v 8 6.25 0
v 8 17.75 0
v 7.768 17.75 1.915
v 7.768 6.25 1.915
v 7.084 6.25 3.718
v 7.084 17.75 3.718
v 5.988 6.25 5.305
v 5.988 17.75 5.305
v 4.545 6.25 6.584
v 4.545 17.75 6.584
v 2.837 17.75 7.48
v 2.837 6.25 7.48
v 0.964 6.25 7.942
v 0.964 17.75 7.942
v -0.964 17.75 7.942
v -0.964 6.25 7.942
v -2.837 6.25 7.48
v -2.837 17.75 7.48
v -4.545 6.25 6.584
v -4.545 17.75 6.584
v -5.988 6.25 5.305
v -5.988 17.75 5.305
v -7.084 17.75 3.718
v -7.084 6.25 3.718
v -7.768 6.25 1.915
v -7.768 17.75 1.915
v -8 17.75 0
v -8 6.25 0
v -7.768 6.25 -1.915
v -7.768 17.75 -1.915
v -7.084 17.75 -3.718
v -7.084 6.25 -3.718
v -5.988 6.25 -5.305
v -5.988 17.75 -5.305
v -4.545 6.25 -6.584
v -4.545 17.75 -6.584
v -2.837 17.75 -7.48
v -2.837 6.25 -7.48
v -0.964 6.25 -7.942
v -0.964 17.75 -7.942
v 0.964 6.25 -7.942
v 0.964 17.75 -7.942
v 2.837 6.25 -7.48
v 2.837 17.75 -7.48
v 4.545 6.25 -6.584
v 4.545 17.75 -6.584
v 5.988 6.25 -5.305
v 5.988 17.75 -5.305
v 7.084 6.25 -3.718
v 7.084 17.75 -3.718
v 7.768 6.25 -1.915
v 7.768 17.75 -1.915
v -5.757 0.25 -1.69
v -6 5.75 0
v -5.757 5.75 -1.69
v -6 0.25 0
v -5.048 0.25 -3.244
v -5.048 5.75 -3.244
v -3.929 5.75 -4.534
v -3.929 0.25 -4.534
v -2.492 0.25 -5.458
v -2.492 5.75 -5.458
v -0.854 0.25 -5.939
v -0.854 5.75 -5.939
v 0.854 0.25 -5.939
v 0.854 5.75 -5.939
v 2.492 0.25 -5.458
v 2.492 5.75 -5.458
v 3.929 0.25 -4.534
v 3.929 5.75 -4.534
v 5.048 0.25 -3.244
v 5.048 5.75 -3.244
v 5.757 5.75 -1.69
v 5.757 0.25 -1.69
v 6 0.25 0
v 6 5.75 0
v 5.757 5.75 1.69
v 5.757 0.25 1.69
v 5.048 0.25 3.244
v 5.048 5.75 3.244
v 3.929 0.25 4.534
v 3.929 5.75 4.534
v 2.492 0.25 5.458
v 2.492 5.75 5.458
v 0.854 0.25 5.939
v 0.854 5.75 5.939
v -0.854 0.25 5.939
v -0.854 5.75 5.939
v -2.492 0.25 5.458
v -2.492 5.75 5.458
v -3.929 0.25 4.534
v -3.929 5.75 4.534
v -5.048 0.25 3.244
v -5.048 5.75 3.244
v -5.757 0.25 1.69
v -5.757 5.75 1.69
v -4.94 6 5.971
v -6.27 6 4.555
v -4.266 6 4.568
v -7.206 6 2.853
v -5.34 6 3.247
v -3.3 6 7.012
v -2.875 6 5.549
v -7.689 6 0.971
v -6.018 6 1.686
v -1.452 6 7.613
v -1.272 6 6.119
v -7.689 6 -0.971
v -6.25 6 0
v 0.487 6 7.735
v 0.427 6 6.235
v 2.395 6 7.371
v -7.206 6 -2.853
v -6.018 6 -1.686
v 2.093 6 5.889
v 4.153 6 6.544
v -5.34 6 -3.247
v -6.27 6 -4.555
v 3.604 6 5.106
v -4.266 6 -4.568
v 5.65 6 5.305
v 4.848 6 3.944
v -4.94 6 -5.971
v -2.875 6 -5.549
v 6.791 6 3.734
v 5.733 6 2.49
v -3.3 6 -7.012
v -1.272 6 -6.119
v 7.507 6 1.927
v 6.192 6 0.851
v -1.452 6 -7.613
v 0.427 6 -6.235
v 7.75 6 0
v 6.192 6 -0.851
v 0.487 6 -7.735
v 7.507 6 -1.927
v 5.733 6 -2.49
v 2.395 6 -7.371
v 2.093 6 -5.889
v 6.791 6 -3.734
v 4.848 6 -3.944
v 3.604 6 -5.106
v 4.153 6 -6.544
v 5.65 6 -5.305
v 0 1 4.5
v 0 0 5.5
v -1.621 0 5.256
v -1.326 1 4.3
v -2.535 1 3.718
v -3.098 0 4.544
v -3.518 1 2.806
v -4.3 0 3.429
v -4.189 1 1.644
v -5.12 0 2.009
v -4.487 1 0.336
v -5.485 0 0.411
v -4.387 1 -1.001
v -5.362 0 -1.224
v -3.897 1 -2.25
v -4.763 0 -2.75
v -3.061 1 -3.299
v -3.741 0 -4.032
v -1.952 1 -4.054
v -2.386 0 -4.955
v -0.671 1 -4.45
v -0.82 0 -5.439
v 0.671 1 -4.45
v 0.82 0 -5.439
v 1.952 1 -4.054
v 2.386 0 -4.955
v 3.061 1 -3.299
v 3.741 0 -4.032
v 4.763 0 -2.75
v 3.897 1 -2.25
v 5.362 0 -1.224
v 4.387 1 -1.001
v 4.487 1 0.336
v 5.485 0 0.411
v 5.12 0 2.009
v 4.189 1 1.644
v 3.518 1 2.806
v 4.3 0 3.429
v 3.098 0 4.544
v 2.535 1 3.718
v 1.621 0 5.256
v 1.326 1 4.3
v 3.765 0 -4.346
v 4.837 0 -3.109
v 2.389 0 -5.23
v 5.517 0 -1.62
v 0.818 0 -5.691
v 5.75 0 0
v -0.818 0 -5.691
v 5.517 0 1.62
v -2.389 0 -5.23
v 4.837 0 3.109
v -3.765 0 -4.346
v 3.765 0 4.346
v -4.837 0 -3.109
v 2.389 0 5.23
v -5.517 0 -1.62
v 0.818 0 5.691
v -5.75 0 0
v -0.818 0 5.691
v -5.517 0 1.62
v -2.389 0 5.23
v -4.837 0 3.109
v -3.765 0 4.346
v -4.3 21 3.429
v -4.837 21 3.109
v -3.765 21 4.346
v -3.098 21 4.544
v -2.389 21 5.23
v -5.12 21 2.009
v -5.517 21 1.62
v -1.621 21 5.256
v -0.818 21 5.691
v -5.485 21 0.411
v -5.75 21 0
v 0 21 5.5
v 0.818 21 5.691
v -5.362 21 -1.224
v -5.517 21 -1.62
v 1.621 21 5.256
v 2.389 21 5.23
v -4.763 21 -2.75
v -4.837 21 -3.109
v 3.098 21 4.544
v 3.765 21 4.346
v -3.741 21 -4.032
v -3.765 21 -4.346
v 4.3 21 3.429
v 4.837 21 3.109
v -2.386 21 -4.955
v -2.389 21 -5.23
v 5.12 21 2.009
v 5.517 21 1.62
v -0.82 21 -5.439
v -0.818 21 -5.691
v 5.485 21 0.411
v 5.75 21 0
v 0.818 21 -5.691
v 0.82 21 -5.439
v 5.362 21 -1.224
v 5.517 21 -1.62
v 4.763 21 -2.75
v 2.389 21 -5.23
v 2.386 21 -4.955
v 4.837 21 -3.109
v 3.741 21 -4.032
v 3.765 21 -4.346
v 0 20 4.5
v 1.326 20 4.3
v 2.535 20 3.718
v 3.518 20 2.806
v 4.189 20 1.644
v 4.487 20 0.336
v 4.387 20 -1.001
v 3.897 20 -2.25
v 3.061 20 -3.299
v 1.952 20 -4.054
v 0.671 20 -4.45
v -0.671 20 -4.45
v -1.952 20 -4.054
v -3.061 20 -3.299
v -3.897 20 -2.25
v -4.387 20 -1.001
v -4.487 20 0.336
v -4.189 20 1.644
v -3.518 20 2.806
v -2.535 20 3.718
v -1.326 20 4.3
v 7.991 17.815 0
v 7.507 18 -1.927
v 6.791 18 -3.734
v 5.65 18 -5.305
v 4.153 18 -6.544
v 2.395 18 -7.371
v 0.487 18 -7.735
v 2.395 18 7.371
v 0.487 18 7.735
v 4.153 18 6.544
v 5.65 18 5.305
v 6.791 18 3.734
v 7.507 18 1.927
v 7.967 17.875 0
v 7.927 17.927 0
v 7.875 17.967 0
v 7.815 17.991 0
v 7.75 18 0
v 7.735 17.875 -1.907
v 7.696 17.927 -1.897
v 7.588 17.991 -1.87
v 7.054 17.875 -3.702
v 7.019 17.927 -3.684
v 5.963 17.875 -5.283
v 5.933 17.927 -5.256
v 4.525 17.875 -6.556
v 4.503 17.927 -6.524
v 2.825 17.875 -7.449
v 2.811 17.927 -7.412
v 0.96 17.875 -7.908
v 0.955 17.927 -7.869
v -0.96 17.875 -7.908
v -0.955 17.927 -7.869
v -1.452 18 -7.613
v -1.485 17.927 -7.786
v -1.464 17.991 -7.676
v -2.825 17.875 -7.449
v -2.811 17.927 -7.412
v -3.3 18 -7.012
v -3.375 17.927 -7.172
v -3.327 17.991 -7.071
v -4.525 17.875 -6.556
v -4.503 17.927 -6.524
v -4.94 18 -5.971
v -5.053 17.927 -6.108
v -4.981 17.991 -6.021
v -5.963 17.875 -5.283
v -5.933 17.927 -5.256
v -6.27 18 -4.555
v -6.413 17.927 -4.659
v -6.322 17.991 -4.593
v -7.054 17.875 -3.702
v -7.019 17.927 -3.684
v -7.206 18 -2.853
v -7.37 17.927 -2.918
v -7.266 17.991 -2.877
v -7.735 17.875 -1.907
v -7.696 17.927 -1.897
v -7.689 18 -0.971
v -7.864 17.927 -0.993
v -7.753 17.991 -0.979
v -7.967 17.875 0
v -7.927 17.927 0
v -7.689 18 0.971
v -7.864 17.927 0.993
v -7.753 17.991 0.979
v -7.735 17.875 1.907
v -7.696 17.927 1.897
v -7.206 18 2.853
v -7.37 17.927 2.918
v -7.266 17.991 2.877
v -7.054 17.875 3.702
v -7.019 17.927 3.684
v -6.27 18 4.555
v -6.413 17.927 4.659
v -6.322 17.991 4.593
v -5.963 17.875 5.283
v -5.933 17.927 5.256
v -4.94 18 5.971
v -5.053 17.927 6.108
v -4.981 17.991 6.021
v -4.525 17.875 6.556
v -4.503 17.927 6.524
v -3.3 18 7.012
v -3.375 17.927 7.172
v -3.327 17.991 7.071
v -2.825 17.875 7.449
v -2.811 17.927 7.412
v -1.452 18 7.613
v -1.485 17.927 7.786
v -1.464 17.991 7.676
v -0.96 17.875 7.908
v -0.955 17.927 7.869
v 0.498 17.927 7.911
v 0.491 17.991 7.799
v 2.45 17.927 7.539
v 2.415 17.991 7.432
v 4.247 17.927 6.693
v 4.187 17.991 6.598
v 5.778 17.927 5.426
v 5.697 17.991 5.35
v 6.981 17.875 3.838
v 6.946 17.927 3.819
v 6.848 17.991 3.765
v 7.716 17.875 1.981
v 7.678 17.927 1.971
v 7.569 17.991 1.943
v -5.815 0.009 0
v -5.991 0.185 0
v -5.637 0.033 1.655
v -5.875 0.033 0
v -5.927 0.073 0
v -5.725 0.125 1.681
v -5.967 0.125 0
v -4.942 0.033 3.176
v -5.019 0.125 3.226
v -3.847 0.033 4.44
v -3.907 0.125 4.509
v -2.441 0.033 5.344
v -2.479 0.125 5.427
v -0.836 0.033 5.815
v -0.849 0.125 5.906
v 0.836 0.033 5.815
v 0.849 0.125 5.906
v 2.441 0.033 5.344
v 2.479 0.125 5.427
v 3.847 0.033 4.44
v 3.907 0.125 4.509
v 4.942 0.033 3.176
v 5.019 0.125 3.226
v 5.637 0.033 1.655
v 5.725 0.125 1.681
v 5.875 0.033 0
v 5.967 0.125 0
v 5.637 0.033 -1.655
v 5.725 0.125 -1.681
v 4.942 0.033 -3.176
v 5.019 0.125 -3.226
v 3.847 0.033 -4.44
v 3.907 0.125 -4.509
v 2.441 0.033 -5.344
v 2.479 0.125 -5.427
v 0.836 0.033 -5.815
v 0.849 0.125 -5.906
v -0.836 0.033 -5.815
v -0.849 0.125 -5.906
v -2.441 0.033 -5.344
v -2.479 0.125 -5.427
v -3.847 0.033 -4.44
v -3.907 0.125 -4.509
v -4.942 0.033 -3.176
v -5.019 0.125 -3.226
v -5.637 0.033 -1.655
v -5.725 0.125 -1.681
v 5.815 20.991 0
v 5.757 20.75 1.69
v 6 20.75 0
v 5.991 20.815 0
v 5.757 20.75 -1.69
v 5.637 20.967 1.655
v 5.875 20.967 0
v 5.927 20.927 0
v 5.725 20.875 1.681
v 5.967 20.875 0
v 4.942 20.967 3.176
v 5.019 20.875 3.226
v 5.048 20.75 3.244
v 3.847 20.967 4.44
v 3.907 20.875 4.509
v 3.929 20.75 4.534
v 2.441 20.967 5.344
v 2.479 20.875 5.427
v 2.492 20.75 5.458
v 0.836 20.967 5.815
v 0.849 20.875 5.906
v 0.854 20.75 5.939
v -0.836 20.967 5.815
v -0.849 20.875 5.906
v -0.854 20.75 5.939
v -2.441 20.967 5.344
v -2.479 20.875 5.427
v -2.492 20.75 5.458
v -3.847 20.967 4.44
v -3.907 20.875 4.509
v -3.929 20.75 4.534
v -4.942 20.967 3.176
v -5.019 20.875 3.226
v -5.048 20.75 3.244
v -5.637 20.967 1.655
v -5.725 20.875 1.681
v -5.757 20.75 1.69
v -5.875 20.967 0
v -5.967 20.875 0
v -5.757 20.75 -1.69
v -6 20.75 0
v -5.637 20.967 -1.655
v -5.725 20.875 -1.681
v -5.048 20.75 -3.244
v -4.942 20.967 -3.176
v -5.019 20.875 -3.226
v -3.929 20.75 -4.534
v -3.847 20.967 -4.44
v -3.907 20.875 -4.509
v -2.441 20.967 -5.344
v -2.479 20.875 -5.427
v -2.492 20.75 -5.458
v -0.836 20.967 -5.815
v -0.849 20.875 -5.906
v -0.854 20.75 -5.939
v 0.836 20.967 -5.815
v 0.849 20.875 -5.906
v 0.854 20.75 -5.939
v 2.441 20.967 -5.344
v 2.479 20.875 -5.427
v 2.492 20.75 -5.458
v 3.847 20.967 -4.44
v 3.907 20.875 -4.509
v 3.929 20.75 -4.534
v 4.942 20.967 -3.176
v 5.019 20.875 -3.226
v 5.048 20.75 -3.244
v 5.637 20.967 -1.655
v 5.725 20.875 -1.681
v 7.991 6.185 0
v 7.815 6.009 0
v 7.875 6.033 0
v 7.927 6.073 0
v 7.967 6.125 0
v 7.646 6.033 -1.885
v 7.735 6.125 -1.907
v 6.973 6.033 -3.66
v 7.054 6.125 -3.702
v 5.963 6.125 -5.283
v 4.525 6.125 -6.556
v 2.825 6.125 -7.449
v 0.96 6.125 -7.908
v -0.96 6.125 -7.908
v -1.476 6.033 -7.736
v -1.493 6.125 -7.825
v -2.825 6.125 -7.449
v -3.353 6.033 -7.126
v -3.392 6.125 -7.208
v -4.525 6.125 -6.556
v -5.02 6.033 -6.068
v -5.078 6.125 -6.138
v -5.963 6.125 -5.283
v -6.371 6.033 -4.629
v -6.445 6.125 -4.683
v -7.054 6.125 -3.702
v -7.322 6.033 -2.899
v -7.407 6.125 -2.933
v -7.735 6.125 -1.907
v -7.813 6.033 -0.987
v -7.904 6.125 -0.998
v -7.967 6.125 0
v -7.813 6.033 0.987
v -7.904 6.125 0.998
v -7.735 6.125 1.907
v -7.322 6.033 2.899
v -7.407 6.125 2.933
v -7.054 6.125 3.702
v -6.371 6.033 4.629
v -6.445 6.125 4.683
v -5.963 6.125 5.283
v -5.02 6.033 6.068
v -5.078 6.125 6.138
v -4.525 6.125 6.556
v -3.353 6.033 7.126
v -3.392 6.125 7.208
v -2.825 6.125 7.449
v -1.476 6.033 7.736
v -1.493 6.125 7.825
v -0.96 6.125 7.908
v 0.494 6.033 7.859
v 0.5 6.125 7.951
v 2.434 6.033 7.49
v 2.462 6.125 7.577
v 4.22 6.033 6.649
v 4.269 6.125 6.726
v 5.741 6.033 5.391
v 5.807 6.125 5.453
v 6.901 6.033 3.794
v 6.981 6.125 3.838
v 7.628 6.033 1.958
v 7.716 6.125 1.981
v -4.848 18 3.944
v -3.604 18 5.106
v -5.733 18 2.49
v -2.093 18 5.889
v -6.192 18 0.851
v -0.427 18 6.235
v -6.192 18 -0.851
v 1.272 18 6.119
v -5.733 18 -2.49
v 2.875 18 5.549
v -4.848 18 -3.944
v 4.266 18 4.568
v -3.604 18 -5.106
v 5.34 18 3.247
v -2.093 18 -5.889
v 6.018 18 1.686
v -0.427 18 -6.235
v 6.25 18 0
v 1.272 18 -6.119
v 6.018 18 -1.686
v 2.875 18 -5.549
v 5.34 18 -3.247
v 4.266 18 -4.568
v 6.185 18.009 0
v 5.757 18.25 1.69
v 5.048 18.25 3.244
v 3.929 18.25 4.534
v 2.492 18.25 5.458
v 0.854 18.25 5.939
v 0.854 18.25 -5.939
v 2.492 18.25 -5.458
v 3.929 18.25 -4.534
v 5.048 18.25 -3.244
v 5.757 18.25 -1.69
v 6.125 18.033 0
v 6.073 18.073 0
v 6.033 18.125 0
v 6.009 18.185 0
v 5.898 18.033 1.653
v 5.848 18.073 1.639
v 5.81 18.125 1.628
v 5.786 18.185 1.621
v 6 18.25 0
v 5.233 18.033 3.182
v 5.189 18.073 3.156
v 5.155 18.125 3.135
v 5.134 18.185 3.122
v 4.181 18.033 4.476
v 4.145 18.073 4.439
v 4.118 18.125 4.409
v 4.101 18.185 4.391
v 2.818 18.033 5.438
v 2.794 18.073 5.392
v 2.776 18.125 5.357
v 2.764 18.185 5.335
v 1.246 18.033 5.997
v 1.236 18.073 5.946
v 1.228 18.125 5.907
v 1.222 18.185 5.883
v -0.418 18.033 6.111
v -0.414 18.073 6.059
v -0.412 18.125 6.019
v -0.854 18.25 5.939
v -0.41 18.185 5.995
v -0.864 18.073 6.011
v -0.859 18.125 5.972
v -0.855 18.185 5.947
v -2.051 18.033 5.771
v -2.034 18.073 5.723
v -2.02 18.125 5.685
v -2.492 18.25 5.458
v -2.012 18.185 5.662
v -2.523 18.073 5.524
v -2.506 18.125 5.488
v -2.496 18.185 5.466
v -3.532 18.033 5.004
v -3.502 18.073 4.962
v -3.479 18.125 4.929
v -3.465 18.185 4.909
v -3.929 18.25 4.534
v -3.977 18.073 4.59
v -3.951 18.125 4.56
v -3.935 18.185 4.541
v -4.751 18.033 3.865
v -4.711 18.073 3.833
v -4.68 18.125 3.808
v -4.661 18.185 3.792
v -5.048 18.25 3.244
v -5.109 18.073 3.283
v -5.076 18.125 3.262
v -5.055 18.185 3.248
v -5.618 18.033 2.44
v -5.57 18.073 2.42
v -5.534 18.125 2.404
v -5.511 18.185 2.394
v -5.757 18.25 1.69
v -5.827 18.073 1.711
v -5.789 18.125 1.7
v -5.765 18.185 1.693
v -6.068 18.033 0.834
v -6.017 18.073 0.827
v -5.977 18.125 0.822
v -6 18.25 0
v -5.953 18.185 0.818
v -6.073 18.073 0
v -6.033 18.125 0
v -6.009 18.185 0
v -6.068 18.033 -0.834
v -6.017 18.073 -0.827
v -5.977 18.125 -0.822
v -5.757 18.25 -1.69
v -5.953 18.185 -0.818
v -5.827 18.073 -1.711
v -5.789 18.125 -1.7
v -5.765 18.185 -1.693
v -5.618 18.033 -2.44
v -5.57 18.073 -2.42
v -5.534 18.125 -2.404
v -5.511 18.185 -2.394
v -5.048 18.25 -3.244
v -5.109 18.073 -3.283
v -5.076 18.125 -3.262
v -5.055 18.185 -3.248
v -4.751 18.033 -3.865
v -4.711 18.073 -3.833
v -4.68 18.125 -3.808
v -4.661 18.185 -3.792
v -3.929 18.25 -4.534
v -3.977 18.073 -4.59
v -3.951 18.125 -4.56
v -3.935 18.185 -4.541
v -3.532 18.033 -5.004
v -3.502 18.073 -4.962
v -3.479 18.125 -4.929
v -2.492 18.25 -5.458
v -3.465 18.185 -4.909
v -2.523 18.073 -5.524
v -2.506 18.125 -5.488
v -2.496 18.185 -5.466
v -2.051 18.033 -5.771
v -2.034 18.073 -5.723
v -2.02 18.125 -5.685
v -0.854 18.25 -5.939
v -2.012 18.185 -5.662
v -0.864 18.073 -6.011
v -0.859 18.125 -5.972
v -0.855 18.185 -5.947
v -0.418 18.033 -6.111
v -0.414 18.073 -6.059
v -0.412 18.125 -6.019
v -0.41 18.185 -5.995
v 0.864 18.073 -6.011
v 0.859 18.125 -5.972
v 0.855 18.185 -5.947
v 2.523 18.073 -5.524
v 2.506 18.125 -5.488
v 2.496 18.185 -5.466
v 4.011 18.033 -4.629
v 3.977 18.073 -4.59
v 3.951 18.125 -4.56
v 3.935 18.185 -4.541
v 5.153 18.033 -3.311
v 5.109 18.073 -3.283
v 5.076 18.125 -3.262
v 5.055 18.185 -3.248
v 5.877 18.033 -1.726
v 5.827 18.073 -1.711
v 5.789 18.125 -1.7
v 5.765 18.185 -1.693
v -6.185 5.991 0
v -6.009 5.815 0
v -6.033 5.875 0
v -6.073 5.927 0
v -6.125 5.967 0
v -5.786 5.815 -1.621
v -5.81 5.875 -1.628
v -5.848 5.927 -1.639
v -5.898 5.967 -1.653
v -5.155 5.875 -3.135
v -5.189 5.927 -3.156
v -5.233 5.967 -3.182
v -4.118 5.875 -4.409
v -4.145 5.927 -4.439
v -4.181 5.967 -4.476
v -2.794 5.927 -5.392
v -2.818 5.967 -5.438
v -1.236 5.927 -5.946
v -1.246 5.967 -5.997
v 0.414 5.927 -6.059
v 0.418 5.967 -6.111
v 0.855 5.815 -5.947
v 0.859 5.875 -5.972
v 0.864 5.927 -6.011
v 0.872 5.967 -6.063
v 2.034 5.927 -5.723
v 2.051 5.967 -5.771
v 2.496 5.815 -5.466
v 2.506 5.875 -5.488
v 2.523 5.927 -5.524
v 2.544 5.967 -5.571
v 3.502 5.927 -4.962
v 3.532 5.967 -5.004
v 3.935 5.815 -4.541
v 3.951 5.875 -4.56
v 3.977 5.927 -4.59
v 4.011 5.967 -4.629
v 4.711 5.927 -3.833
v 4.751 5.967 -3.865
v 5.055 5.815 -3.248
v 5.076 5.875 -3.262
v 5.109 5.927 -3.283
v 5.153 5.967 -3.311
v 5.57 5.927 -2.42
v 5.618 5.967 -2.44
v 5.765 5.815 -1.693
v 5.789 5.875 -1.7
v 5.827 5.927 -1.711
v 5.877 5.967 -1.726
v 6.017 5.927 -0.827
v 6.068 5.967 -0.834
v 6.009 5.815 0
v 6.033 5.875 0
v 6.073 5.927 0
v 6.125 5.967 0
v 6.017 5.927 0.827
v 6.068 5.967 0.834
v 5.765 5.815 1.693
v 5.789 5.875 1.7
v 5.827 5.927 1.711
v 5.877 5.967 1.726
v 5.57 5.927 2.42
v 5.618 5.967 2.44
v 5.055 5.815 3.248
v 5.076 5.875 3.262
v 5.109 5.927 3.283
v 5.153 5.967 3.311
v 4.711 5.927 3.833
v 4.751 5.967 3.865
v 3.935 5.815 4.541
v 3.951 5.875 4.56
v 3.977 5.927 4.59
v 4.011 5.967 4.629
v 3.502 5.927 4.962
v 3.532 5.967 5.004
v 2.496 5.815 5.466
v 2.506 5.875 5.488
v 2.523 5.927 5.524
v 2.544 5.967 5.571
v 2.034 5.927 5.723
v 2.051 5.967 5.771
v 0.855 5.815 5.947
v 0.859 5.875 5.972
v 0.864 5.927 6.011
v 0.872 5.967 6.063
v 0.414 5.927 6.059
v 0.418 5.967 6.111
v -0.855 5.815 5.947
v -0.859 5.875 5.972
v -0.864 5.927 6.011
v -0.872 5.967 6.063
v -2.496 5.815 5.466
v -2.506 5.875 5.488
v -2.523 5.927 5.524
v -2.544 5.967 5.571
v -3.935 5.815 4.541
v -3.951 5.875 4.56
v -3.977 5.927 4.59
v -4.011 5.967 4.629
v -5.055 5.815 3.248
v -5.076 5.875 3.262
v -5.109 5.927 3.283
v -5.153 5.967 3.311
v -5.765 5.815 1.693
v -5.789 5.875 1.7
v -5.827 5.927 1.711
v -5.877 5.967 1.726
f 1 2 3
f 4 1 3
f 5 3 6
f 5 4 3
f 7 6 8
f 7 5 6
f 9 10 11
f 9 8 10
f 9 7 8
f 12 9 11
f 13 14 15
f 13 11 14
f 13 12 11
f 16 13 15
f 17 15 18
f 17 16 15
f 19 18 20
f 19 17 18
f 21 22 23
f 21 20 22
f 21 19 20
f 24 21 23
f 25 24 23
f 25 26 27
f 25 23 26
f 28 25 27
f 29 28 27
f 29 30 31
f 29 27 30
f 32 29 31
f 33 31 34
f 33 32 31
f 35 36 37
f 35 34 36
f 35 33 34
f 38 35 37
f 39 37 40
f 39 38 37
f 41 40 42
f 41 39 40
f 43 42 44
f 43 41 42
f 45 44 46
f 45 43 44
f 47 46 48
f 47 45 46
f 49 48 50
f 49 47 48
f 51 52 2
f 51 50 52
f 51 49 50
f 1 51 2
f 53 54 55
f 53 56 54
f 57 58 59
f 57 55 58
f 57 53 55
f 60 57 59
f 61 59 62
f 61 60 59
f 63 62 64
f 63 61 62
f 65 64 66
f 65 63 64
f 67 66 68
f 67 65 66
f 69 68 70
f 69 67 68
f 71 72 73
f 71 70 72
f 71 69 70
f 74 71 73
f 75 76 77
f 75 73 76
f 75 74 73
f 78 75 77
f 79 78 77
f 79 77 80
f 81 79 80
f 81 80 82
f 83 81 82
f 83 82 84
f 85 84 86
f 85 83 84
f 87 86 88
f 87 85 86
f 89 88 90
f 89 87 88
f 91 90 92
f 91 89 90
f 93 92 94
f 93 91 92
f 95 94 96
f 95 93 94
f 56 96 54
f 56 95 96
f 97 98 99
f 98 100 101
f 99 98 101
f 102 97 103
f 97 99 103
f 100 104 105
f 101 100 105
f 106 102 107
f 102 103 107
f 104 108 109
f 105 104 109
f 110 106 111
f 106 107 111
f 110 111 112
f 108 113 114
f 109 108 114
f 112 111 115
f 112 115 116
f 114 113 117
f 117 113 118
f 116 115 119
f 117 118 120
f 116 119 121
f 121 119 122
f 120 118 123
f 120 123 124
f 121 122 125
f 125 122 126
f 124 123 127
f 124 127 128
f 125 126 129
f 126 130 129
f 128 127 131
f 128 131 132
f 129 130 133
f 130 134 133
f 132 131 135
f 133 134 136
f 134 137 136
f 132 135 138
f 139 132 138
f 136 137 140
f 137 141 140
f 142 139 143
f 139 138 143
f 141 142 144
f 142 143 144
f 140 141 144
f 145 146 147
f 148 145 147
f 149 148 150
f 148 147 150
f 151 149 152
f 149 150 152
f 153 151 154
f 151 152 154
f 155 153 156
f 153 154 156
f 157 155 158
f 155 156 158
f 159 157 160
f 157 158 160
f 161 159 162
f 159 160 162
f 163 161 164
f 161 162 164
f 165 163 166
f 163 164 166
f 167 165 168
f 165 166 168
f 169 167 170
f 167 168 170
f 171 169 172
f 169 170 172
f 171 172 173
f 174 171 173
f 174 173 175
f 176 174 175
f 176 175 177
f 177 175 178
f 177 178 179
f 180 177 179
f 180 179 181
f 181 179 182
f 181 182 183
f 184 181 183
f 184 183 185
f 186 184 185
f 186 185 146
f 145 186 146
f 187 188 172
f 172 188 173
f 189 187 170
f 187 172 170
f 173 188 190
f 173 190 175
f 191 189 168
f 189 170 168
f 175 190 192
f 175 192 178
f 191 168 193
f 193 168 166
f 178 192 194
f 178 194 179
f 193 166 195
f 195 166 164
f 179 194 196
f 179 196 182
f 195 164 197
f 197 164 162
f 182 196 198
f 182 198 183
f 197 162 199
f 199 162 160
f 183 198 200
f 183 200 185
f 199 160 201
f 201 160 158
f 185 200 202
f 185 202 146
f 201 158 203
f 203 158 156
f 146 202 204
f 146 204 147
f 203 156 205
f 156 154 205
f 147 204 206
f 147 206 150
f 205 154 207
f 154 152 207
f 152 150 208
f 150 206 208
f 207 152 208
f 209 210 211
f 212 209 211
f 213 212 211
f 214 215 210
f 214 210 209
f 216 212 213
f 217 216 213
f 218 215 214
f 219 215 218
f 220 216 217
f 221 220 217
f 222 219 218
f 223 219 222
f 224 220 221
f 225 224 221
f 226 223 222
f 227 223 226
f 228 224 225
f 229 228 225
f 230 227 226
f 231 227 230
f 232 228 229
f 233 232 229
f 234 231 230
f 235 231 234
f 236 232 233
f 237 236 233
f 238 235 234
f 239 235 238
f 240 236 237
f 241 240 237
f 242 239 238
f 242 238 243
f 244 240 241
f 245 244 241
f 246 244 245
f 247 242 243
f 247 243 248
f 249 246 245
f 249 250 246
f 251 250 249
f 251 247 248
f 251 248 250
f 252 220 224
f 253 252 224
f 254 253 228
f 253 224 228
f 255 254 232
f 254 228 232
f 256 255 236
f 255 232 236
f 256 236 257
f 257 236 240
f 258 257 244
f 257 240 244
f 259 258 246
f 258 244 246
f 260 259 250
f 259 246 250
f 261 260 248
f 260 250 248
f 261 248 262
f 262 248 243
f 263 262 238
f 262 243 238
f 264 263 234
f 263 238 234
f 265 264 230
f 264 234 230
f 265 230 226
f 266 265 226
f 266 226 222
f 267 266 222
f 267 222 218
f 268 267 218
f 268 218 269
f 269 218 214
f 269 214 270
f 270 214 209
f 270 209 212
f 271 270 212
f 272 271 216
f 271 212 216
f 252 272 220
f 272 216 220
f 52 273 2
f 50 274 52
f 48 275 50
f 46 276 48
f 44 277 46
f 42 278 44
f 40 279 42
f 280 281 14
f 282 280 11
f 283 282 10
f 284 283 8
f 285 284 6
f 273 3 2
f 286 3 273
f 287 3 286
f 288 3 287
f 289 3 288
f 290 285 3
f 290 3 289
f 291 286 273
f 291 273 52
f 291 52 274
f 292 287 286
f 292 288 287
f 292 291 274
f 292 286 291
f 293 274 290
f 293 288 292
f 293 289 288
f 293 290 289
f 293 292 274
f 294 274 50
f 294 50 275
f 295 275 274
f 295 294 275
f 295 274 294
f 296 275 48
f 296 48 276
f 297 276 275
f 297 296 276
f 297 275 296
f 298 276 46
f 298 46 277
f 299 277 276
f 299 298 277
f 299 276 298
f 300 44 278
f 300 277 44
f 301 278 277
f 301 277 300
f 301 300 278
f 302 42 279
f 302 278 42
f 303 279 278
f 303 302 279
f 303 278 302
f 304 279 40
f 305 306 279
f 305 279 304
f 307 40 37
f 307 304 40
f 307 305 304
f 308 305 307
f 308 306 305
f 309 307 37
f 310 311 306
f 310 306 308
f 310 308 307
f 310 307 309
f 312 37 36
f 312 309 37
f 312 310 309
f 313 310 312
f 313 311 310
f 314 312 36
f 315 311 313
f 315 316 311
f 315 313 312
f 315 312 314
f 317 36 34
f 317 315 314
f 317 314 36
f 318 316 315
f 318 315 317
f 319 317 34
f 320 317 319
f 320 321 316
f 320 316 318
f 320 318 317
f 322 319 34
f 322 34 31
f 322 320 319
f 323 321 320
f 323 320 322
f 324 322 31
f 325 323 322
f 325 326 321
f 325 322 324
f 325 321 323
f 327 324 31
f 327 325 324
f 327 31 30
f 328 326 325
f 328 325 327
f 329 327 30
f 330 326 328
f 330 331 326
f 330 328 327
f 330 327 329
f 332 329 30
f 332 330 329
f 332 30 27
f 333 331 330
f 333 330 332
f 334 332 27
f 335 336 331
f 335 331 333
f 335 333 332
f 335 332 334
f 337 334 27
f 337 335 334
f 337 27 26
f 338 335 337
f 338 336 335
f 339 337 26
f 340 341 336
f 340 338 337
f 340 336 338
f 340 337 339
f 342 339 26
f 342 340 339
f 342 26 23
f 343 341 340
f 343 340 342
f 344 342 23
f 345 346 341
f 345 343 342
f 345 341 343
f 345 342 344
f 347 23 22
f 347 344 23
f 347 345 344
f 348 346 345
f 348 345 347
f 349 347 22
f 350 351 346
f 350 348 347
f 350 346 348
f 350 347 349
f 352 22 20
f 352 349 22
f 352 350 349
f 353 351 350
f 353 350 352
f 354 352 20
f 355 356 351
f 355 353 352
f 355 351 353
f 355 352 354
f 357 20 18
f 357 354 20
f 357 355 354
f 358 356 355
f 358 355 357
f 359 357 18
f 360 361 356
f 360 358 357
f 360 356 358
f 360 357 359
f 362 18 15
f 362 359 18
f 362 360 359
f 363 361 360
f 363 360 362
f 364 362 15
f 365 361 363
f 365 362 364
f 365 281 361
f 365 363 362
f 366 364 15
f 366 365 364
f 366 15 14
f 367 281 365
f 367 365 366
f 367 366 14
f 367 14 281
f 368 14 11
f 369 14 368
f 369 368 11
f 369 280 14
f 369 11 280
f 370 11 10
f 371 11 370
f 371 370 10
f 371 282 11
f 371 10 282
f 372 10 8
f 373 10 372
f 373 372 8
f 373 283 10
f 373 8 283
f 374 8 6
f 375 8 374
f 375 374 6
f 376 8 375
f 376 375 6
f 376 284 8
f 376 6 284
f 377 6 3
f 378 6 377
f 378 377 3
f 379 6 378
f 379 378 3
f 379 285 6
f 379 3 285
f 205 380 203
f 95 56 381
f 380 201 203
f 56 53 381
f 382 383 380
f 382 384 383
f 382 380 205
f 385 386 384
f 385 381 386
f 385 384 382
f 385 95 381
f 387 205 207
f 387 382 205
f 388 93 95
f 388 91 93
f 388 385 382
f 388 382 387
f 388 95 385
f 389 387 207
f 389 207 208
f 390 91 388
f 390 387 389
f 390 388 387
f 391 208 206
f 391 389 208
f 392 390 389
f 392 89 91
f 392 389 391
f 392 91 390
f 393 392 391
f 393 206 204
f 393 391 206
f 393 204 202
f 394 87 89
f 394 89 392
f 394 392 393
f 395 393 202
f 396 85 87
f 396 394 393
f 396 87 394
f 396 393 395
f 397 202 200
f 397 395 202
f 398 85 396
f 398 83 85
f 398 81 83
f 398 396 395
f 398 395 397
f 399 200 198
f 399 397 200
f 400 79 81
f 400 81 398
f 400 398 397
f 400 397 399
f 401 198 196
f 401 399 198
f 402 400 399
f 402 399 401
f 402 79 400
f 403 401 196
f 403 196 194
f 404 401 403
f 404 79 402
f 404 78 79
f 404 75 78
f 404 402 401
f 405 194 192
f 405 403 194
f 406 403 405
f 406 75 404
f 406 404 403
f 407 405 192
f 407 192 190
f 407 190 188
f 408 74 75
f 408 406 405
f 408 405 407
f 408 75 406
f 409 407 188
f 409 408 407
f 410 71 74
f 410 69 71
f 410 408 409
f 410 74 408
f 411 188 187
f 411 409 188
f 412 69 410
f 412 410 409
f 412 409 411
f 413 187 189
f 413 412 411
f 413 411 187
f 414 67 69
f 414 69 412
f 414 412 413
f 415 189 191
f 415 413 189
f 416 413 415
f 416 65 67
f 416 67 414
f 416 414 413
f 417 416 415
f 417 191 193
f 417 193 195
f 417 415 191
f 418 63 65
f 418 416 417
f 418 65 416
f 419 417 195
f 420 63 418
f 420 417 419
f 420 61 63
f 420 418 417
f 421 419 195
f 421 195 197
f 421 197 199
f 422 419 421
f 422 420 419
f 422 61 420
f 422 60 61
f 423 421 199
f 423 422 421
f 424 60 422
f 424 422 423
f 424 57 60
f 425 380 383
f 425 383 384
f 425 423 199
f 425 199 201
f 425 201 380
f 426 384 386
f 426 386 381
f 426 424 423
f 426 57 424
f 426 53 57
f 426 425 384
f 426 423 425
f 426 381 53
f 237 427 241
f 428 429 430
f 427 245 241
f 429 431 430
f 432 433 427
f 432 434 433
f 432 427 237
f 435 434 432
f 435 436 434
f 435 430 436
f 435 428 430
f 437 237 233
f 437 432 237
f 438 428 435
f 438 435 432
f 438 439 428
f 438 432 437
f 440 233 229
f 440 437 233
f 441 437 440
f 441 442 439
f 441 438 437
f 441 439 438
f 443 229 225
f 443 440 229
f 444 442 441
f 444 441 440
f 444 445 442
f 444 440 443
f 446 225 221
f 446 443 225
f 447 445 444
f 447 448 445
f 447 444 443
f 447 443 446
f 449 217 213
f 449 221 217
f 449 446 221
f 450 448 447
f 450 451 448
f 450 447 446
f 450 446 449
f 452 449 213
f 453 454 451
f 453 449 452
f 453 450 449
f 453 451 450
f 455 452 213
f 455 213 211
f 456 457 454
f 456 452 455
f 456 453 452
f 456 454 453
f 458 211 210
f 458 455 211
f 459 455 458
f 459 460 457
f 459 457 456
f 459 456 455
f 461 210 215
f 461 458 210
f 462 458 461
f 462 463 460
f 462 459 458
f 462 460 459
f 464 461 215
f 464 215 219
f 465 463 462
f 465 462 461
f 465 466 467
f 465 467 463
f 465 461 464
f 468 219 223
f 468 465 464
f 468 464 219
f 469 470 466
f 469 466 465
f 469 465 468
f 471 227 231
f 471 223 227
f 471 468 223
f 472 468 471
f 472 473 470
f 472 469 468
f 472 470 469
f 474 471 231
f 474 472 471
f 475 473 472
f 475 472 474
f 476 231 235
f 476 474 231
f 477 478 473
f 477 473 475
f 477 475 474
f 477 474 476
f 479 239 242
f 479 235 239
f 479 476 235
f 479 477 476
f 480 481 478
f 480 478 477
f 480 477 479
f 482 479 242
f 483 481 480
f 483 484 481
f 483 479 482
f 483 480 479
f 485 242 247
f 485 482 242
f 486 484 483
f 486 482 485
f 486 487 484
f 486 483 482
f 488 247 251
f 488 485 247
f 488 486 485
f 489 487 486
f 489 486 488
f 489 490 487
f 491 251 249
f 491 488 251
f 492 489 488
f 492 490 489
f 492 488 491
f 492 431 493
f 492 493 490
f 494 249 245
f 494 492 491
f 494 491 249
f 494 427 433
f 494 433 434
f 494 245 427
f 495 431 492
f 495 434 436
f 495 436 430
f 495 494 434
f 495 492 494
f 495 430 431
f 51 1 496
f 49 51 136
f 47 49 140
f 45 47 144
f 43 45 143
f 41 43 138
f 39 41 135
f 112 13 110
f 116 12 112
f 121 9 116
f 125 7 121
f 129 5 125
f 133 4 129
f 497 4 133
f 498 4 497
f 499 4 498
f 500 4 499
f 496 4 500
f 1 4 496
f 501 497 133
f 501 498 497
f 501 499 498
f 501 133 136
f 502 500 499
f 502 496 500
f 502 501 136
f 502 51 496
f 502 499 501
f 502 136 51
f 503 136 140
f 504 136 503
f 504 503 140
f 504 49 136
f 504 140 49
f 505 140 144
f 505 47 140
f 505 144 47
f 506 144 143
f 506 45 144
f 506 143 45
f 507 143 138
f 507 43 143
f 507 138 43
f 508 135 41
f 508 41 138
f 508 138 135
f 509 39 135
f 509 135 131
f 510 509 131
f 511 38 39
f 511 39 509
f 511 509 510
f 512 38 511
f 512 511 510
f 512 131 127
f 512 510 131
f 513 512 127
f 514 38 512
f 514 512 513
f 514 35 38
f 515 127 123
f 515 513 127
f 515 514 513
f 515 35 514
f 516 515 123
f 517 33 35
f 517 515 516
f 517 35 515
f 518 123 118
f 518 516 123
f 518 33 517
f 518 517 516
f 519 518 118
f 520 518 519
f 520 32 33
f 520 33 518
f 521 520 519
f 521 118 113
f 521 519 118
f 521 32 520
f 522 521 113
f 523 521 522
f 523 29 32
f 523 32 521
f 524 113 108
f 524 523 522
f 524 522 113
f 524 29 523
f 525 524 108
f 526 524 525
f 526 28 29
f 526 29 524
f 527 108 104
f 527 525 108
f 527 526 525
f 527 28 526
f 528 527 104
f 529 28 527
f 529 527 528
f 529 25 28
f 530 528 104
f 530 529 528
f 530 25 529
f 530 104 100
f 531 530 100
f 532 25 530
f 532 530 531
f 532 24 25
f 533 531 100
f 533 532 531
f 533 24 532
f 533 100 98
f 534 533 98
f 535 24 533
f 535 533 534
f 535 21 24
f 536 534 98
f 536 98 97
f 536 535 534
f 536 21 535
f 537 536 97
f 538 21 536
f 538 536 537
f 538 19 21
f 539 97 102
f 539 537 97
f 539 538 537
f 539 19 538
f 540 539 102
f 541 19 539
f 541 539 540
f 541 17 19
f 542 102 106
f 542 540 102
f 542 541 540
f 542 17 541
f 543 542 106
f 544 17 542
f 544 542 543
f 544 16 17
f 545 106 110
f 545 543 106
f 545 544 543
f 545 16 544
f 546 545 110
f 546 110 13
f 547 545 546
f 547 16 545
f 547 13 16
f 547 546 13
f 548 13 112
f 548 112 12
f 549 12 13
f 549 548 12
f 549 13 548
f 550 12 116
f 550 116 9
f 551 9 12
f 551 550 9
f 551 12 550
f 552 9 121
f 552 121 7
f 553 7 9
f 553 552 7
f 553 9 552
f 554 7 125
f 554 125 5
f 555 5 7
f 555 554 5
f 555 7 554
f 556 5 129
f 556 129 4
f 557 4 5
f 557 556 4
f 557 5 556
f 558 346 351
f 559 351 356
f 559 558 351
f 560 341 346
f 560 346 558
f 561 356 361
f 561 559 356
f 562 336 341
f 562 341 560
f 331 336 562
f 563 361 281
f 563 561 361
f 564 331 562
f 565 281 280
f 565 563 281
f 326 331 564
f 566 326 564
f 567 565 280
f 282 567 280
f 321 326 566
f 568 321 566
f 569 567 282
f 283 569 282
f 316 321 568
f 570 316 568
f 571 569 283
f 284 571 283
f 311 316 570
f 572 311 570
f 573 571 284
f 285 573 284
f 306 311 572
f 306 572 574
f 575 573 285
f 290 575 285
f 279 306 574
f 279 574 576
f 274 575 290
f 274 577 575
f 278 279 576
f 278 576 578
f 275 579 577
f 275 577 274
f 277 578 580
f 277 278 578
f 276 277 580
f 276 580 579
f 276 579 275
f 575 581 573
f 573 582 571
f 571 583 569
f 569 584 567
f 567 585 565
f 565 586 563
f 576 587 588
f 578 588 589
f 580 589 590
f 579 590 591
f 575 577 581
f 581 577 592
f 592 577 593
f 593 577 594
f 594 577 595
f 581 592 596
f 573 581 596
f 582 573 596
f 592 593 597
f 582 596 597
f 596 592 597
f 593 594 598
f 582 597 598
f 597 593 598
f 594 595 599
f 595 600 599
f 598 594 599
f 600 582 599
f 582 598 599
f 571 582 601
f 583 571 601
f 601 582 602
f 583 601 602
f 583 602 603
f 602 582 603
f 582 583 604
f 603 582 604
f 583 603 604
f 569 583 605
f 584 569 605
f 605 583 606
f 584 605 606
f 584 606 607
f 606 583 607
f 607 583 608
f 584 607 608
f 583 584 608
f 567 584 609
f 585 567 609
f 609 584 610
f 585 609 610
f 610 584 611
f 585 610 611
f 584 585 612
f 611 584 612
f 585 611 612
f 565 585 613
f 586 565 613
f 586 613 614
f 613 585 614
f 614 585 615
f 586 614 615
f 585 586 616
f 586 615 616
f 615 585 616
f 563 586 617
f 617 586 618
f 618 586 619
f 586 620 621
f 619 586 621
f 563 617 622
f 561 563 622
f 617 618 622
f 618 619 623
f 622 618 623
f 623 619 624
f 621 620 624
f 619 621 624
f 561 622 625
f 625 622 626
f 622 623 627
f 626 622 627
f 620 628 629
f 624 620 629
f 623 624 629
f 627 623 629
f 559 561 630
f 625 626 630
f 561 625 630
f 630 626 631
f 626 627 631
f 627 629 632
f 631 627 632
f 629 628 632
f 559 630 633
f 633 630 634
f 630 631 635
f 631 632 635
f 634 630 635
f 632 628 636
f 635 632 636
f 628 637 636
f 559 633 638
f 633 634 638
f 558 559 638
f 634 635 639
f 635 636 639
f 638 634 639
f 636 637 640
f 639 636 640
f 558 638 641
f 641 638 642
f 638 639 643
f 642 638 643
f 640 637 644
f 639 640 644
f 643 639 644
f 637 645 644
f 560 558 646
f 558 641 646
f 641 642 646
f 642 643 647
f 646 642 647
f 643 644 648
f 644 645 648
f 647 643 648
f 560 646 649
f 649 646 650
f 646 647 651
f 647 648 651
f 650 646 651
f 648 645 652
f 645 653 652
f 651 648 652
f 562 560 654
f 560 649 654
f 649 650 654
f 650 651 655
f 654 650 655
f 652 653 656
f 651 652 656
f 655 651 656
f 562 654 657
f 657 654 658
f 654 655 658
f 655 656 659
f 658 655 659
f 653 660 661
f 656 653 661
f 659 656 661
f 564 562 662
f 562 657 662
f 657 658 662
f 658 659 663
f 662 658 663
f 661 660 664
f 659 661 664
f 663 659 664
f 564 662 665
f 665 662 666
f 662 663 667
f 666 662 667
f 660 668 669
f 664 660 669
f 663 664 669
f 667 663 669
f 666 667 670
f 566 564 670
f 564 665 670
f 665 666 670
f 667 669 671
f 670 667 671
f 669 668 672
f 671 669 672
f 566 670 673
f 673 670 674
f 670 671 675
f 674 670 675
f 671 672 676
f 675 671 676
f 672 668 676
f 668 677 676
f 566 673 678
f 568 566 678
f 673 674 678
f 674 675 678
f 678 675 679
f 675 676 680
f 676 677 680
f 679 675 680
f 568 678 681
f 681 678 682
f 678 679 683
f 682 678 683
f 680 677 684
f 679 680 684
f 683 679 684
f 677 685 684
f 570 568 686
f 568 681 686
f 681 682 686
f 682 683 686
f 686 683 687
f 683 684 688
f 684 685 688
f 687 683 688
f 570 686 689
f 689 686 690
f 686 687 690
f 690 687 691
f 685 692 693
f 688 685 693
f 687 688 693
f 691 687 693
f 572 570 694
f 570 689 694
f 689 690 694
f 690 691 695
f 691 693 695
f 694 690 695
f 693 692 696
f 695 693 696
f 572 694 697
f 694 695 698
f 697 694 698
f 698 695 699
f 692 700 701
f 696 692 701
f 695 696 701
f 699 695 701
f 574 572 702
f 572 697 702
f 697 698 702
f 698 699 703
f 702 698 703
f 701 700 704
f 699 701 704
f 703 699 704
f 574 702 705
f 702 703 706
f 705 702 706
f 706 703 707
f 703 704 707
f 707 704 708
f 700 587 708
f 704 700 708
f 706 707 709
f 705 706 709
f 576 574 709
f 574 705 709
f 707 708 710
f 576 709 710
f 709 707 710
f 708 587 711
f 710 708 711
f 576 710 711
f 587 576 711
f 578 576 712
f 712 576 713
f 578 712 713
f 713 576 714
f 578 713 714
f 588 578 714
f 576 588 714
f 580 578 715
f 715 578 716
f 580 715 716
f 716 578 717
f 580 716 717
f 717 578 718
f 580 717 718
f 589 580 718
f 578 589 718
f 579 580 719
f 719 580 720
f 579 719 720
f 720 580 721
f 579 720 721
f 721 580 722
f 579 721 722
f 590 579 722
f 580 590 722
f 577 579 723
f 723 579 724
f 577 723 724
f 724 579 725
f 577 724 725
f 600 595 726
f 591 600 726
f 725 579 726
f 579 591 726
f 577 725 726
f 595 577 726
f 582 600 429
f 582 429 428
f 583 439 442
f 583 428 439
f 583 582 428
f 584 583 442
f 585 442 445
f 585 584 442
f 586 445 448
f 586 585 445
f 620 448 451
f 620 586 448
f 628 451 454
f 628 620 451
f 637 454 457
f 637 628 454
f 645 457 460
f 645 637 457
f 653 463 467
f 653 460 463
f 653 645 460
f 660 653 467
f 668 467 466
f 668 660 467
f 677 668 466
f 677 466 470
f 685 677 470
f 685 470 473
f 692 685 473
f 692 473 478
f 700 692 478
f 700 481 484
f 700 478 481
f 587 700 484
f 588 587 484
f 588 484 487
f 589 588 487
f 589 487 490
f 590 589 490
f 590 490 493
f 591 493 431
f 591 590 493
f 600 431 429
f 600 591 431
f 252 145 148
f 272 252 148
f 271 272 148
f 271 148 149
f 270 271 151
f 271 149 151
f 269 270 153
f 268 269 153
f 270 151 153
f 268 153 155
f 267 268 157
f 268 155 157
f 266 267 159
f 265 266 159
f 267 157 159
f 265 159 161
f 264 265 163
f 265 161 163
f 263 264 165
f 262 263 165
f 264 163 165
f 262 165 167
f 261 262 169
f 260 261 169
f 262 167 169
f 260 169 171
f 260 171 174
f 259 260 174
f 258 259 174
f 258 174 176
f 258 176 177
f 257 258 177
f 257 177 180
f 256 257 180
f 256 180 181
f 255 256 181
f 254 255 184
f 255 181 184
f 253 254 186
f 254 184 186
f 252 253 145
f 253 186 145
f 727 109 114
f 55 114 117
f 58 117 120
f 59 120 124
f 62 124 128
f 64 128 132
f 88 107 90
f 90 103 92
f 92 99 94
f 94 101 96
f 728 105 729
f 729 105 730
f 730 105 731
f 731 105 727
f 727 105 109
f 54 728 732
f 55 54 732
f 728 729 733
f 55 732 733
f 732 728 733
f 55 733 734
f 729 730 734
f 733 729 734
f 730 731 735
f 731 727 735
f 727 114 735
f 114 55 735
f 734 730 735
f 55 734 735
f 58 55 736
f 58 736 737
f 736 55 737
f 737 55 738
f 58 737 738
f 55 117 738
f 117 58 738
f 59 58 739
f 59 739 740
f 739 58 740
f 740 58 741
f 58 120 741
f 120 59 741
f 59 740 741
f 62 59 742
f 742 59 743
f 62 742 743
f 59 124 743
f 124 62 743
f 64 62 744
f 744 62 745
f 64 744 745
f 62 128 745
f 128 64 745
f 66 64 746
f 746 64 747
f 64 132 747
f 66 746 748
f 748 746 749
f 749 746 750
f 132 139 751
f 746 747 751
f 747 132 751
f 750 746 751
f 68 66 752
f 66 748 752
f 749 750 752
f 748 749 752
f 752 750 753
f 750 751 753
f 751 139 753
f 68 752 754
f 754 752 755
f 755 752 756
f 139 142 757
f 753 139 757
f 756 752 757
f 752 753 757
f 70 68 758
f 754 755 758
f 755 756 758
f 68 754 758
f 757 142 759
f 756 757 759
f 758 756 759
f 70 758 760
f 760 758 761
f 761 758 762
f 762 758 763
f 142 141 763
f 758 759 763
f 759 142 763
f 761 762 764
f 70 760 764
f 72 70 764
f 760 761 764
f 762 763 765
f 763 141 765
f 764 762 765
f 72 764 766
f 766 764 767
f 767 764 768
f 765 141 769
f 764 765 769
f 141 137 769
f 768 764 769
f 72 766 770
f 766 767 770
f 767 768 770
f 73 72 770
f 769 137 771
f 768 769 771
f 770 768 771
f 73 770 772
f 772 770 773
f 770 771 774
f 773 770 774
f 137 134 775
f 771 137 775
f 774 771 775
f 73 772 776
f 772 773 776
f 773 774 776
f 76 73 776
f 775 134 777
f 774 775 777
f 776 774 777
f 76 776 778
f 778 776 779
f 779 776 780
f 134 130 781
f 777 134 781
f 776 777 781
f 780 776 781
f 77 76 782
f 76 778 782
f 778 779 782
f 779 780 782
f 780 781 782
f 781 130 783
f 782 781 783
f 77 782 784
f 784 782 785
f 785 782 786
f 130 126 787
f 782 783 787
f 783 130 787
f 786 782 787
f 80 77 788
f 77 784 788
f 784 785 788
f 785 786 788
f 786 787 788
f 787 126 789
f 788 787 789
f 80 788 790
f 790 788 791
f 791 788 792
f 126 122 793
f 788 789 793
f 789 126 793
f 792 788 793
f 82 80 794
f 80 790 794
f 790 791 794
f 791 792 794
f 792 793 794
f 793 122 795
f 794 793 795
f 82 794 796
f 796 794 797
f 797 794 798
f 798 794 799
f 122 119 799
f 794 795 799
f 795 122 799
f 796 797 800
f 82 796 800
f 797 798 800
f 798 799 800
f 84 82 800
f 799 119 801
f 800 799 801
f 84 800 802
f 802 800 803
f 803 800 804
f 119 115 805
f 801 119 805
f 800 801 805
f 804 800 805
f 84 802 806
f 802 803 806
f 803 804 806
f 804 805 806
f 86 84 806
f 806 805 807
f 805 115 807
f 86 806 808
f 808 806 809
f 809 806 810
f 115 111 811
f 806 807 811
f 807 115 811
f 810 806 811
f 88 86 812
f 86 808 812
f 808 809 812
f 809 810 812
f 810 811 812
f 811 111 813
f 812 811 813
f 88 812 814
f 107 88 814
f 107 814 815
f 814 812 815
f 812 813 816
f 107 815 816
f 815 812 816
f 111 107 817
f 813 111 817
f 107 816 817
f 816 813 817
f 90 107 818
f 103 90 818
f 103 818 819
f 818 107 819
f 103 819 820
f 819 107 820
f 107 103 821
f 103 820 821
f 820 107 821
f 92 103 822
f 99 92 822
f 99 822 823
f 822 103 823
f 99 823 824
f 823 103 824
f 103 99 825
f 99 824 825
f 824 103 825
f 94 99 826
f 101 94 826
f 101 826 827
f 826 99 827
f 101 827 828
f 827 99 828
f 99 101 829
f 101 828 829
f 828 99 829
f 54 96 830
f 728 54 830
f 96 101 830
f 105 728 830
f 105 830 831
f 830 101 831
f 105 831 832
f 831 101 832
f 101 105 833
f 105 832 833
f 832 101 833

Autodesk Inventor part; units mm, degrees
ref_plane "YZ Plane" through (0, 0, 0) normal (1, 0, 0) x (0, 1, 0)
ref_plane "XZ Plane" through (0, 0, 0) normal (0, 1, 0) x (-1, 0, 0)
ref_plane "XY Plane" through (0, 0, 0) normal (0, 0, 1) x (1, 0, 0)
sketch "Sketch1" plane through (0, 0, 0) normal (0, 1, 0) x (-1, 0, 0)
  circle A0 centre (0, 0) radius 6
  dimension "d0" = 12
extrude "Extrusion1" add sketch "Sketch1" along normal blind 6
sketch "Sketch2" plane through (0, 6, 0) normal (0, 1, 0) x (1, 0, 0)
  circle A0 centre (0, 0) radius 8
  dimension "d3" = 16
extrude "Extrusion2" add sketch "Sketch2" along normal blind 12
sketch "Sketch3" plane through (0, 18, 0) normal (0, 1, 0) x (1, 0, 0)
  circle A0 centre (0, 0) radius 6
  dimension "d6" = 12
extrude "Extrusion3" add sketch "Sketch3" along normal blind 3
sketch "Sketch4" plane through (0, 21, 0) normal (0, 1, 0) x (1, 0, 0)
  point P0 (0, 0)
hole "Hole1" at (0, 21, 0) direction (0, -1, 0) diameter 9 end through all
chamfer "Chamfer1" distance 1 angle 45 2 edges at (0, 21, -4.5) (0, 0, -4.5)
fillet "Fillet1" radius 0.25 6 edges at (-6, 21, 0) (-6, 18, 0) (-8, 18, 0) (-8, 6, 0) (6, 0, 0) (6, 6, 0)
properties part number "Z-Abstandhalter_unten"
